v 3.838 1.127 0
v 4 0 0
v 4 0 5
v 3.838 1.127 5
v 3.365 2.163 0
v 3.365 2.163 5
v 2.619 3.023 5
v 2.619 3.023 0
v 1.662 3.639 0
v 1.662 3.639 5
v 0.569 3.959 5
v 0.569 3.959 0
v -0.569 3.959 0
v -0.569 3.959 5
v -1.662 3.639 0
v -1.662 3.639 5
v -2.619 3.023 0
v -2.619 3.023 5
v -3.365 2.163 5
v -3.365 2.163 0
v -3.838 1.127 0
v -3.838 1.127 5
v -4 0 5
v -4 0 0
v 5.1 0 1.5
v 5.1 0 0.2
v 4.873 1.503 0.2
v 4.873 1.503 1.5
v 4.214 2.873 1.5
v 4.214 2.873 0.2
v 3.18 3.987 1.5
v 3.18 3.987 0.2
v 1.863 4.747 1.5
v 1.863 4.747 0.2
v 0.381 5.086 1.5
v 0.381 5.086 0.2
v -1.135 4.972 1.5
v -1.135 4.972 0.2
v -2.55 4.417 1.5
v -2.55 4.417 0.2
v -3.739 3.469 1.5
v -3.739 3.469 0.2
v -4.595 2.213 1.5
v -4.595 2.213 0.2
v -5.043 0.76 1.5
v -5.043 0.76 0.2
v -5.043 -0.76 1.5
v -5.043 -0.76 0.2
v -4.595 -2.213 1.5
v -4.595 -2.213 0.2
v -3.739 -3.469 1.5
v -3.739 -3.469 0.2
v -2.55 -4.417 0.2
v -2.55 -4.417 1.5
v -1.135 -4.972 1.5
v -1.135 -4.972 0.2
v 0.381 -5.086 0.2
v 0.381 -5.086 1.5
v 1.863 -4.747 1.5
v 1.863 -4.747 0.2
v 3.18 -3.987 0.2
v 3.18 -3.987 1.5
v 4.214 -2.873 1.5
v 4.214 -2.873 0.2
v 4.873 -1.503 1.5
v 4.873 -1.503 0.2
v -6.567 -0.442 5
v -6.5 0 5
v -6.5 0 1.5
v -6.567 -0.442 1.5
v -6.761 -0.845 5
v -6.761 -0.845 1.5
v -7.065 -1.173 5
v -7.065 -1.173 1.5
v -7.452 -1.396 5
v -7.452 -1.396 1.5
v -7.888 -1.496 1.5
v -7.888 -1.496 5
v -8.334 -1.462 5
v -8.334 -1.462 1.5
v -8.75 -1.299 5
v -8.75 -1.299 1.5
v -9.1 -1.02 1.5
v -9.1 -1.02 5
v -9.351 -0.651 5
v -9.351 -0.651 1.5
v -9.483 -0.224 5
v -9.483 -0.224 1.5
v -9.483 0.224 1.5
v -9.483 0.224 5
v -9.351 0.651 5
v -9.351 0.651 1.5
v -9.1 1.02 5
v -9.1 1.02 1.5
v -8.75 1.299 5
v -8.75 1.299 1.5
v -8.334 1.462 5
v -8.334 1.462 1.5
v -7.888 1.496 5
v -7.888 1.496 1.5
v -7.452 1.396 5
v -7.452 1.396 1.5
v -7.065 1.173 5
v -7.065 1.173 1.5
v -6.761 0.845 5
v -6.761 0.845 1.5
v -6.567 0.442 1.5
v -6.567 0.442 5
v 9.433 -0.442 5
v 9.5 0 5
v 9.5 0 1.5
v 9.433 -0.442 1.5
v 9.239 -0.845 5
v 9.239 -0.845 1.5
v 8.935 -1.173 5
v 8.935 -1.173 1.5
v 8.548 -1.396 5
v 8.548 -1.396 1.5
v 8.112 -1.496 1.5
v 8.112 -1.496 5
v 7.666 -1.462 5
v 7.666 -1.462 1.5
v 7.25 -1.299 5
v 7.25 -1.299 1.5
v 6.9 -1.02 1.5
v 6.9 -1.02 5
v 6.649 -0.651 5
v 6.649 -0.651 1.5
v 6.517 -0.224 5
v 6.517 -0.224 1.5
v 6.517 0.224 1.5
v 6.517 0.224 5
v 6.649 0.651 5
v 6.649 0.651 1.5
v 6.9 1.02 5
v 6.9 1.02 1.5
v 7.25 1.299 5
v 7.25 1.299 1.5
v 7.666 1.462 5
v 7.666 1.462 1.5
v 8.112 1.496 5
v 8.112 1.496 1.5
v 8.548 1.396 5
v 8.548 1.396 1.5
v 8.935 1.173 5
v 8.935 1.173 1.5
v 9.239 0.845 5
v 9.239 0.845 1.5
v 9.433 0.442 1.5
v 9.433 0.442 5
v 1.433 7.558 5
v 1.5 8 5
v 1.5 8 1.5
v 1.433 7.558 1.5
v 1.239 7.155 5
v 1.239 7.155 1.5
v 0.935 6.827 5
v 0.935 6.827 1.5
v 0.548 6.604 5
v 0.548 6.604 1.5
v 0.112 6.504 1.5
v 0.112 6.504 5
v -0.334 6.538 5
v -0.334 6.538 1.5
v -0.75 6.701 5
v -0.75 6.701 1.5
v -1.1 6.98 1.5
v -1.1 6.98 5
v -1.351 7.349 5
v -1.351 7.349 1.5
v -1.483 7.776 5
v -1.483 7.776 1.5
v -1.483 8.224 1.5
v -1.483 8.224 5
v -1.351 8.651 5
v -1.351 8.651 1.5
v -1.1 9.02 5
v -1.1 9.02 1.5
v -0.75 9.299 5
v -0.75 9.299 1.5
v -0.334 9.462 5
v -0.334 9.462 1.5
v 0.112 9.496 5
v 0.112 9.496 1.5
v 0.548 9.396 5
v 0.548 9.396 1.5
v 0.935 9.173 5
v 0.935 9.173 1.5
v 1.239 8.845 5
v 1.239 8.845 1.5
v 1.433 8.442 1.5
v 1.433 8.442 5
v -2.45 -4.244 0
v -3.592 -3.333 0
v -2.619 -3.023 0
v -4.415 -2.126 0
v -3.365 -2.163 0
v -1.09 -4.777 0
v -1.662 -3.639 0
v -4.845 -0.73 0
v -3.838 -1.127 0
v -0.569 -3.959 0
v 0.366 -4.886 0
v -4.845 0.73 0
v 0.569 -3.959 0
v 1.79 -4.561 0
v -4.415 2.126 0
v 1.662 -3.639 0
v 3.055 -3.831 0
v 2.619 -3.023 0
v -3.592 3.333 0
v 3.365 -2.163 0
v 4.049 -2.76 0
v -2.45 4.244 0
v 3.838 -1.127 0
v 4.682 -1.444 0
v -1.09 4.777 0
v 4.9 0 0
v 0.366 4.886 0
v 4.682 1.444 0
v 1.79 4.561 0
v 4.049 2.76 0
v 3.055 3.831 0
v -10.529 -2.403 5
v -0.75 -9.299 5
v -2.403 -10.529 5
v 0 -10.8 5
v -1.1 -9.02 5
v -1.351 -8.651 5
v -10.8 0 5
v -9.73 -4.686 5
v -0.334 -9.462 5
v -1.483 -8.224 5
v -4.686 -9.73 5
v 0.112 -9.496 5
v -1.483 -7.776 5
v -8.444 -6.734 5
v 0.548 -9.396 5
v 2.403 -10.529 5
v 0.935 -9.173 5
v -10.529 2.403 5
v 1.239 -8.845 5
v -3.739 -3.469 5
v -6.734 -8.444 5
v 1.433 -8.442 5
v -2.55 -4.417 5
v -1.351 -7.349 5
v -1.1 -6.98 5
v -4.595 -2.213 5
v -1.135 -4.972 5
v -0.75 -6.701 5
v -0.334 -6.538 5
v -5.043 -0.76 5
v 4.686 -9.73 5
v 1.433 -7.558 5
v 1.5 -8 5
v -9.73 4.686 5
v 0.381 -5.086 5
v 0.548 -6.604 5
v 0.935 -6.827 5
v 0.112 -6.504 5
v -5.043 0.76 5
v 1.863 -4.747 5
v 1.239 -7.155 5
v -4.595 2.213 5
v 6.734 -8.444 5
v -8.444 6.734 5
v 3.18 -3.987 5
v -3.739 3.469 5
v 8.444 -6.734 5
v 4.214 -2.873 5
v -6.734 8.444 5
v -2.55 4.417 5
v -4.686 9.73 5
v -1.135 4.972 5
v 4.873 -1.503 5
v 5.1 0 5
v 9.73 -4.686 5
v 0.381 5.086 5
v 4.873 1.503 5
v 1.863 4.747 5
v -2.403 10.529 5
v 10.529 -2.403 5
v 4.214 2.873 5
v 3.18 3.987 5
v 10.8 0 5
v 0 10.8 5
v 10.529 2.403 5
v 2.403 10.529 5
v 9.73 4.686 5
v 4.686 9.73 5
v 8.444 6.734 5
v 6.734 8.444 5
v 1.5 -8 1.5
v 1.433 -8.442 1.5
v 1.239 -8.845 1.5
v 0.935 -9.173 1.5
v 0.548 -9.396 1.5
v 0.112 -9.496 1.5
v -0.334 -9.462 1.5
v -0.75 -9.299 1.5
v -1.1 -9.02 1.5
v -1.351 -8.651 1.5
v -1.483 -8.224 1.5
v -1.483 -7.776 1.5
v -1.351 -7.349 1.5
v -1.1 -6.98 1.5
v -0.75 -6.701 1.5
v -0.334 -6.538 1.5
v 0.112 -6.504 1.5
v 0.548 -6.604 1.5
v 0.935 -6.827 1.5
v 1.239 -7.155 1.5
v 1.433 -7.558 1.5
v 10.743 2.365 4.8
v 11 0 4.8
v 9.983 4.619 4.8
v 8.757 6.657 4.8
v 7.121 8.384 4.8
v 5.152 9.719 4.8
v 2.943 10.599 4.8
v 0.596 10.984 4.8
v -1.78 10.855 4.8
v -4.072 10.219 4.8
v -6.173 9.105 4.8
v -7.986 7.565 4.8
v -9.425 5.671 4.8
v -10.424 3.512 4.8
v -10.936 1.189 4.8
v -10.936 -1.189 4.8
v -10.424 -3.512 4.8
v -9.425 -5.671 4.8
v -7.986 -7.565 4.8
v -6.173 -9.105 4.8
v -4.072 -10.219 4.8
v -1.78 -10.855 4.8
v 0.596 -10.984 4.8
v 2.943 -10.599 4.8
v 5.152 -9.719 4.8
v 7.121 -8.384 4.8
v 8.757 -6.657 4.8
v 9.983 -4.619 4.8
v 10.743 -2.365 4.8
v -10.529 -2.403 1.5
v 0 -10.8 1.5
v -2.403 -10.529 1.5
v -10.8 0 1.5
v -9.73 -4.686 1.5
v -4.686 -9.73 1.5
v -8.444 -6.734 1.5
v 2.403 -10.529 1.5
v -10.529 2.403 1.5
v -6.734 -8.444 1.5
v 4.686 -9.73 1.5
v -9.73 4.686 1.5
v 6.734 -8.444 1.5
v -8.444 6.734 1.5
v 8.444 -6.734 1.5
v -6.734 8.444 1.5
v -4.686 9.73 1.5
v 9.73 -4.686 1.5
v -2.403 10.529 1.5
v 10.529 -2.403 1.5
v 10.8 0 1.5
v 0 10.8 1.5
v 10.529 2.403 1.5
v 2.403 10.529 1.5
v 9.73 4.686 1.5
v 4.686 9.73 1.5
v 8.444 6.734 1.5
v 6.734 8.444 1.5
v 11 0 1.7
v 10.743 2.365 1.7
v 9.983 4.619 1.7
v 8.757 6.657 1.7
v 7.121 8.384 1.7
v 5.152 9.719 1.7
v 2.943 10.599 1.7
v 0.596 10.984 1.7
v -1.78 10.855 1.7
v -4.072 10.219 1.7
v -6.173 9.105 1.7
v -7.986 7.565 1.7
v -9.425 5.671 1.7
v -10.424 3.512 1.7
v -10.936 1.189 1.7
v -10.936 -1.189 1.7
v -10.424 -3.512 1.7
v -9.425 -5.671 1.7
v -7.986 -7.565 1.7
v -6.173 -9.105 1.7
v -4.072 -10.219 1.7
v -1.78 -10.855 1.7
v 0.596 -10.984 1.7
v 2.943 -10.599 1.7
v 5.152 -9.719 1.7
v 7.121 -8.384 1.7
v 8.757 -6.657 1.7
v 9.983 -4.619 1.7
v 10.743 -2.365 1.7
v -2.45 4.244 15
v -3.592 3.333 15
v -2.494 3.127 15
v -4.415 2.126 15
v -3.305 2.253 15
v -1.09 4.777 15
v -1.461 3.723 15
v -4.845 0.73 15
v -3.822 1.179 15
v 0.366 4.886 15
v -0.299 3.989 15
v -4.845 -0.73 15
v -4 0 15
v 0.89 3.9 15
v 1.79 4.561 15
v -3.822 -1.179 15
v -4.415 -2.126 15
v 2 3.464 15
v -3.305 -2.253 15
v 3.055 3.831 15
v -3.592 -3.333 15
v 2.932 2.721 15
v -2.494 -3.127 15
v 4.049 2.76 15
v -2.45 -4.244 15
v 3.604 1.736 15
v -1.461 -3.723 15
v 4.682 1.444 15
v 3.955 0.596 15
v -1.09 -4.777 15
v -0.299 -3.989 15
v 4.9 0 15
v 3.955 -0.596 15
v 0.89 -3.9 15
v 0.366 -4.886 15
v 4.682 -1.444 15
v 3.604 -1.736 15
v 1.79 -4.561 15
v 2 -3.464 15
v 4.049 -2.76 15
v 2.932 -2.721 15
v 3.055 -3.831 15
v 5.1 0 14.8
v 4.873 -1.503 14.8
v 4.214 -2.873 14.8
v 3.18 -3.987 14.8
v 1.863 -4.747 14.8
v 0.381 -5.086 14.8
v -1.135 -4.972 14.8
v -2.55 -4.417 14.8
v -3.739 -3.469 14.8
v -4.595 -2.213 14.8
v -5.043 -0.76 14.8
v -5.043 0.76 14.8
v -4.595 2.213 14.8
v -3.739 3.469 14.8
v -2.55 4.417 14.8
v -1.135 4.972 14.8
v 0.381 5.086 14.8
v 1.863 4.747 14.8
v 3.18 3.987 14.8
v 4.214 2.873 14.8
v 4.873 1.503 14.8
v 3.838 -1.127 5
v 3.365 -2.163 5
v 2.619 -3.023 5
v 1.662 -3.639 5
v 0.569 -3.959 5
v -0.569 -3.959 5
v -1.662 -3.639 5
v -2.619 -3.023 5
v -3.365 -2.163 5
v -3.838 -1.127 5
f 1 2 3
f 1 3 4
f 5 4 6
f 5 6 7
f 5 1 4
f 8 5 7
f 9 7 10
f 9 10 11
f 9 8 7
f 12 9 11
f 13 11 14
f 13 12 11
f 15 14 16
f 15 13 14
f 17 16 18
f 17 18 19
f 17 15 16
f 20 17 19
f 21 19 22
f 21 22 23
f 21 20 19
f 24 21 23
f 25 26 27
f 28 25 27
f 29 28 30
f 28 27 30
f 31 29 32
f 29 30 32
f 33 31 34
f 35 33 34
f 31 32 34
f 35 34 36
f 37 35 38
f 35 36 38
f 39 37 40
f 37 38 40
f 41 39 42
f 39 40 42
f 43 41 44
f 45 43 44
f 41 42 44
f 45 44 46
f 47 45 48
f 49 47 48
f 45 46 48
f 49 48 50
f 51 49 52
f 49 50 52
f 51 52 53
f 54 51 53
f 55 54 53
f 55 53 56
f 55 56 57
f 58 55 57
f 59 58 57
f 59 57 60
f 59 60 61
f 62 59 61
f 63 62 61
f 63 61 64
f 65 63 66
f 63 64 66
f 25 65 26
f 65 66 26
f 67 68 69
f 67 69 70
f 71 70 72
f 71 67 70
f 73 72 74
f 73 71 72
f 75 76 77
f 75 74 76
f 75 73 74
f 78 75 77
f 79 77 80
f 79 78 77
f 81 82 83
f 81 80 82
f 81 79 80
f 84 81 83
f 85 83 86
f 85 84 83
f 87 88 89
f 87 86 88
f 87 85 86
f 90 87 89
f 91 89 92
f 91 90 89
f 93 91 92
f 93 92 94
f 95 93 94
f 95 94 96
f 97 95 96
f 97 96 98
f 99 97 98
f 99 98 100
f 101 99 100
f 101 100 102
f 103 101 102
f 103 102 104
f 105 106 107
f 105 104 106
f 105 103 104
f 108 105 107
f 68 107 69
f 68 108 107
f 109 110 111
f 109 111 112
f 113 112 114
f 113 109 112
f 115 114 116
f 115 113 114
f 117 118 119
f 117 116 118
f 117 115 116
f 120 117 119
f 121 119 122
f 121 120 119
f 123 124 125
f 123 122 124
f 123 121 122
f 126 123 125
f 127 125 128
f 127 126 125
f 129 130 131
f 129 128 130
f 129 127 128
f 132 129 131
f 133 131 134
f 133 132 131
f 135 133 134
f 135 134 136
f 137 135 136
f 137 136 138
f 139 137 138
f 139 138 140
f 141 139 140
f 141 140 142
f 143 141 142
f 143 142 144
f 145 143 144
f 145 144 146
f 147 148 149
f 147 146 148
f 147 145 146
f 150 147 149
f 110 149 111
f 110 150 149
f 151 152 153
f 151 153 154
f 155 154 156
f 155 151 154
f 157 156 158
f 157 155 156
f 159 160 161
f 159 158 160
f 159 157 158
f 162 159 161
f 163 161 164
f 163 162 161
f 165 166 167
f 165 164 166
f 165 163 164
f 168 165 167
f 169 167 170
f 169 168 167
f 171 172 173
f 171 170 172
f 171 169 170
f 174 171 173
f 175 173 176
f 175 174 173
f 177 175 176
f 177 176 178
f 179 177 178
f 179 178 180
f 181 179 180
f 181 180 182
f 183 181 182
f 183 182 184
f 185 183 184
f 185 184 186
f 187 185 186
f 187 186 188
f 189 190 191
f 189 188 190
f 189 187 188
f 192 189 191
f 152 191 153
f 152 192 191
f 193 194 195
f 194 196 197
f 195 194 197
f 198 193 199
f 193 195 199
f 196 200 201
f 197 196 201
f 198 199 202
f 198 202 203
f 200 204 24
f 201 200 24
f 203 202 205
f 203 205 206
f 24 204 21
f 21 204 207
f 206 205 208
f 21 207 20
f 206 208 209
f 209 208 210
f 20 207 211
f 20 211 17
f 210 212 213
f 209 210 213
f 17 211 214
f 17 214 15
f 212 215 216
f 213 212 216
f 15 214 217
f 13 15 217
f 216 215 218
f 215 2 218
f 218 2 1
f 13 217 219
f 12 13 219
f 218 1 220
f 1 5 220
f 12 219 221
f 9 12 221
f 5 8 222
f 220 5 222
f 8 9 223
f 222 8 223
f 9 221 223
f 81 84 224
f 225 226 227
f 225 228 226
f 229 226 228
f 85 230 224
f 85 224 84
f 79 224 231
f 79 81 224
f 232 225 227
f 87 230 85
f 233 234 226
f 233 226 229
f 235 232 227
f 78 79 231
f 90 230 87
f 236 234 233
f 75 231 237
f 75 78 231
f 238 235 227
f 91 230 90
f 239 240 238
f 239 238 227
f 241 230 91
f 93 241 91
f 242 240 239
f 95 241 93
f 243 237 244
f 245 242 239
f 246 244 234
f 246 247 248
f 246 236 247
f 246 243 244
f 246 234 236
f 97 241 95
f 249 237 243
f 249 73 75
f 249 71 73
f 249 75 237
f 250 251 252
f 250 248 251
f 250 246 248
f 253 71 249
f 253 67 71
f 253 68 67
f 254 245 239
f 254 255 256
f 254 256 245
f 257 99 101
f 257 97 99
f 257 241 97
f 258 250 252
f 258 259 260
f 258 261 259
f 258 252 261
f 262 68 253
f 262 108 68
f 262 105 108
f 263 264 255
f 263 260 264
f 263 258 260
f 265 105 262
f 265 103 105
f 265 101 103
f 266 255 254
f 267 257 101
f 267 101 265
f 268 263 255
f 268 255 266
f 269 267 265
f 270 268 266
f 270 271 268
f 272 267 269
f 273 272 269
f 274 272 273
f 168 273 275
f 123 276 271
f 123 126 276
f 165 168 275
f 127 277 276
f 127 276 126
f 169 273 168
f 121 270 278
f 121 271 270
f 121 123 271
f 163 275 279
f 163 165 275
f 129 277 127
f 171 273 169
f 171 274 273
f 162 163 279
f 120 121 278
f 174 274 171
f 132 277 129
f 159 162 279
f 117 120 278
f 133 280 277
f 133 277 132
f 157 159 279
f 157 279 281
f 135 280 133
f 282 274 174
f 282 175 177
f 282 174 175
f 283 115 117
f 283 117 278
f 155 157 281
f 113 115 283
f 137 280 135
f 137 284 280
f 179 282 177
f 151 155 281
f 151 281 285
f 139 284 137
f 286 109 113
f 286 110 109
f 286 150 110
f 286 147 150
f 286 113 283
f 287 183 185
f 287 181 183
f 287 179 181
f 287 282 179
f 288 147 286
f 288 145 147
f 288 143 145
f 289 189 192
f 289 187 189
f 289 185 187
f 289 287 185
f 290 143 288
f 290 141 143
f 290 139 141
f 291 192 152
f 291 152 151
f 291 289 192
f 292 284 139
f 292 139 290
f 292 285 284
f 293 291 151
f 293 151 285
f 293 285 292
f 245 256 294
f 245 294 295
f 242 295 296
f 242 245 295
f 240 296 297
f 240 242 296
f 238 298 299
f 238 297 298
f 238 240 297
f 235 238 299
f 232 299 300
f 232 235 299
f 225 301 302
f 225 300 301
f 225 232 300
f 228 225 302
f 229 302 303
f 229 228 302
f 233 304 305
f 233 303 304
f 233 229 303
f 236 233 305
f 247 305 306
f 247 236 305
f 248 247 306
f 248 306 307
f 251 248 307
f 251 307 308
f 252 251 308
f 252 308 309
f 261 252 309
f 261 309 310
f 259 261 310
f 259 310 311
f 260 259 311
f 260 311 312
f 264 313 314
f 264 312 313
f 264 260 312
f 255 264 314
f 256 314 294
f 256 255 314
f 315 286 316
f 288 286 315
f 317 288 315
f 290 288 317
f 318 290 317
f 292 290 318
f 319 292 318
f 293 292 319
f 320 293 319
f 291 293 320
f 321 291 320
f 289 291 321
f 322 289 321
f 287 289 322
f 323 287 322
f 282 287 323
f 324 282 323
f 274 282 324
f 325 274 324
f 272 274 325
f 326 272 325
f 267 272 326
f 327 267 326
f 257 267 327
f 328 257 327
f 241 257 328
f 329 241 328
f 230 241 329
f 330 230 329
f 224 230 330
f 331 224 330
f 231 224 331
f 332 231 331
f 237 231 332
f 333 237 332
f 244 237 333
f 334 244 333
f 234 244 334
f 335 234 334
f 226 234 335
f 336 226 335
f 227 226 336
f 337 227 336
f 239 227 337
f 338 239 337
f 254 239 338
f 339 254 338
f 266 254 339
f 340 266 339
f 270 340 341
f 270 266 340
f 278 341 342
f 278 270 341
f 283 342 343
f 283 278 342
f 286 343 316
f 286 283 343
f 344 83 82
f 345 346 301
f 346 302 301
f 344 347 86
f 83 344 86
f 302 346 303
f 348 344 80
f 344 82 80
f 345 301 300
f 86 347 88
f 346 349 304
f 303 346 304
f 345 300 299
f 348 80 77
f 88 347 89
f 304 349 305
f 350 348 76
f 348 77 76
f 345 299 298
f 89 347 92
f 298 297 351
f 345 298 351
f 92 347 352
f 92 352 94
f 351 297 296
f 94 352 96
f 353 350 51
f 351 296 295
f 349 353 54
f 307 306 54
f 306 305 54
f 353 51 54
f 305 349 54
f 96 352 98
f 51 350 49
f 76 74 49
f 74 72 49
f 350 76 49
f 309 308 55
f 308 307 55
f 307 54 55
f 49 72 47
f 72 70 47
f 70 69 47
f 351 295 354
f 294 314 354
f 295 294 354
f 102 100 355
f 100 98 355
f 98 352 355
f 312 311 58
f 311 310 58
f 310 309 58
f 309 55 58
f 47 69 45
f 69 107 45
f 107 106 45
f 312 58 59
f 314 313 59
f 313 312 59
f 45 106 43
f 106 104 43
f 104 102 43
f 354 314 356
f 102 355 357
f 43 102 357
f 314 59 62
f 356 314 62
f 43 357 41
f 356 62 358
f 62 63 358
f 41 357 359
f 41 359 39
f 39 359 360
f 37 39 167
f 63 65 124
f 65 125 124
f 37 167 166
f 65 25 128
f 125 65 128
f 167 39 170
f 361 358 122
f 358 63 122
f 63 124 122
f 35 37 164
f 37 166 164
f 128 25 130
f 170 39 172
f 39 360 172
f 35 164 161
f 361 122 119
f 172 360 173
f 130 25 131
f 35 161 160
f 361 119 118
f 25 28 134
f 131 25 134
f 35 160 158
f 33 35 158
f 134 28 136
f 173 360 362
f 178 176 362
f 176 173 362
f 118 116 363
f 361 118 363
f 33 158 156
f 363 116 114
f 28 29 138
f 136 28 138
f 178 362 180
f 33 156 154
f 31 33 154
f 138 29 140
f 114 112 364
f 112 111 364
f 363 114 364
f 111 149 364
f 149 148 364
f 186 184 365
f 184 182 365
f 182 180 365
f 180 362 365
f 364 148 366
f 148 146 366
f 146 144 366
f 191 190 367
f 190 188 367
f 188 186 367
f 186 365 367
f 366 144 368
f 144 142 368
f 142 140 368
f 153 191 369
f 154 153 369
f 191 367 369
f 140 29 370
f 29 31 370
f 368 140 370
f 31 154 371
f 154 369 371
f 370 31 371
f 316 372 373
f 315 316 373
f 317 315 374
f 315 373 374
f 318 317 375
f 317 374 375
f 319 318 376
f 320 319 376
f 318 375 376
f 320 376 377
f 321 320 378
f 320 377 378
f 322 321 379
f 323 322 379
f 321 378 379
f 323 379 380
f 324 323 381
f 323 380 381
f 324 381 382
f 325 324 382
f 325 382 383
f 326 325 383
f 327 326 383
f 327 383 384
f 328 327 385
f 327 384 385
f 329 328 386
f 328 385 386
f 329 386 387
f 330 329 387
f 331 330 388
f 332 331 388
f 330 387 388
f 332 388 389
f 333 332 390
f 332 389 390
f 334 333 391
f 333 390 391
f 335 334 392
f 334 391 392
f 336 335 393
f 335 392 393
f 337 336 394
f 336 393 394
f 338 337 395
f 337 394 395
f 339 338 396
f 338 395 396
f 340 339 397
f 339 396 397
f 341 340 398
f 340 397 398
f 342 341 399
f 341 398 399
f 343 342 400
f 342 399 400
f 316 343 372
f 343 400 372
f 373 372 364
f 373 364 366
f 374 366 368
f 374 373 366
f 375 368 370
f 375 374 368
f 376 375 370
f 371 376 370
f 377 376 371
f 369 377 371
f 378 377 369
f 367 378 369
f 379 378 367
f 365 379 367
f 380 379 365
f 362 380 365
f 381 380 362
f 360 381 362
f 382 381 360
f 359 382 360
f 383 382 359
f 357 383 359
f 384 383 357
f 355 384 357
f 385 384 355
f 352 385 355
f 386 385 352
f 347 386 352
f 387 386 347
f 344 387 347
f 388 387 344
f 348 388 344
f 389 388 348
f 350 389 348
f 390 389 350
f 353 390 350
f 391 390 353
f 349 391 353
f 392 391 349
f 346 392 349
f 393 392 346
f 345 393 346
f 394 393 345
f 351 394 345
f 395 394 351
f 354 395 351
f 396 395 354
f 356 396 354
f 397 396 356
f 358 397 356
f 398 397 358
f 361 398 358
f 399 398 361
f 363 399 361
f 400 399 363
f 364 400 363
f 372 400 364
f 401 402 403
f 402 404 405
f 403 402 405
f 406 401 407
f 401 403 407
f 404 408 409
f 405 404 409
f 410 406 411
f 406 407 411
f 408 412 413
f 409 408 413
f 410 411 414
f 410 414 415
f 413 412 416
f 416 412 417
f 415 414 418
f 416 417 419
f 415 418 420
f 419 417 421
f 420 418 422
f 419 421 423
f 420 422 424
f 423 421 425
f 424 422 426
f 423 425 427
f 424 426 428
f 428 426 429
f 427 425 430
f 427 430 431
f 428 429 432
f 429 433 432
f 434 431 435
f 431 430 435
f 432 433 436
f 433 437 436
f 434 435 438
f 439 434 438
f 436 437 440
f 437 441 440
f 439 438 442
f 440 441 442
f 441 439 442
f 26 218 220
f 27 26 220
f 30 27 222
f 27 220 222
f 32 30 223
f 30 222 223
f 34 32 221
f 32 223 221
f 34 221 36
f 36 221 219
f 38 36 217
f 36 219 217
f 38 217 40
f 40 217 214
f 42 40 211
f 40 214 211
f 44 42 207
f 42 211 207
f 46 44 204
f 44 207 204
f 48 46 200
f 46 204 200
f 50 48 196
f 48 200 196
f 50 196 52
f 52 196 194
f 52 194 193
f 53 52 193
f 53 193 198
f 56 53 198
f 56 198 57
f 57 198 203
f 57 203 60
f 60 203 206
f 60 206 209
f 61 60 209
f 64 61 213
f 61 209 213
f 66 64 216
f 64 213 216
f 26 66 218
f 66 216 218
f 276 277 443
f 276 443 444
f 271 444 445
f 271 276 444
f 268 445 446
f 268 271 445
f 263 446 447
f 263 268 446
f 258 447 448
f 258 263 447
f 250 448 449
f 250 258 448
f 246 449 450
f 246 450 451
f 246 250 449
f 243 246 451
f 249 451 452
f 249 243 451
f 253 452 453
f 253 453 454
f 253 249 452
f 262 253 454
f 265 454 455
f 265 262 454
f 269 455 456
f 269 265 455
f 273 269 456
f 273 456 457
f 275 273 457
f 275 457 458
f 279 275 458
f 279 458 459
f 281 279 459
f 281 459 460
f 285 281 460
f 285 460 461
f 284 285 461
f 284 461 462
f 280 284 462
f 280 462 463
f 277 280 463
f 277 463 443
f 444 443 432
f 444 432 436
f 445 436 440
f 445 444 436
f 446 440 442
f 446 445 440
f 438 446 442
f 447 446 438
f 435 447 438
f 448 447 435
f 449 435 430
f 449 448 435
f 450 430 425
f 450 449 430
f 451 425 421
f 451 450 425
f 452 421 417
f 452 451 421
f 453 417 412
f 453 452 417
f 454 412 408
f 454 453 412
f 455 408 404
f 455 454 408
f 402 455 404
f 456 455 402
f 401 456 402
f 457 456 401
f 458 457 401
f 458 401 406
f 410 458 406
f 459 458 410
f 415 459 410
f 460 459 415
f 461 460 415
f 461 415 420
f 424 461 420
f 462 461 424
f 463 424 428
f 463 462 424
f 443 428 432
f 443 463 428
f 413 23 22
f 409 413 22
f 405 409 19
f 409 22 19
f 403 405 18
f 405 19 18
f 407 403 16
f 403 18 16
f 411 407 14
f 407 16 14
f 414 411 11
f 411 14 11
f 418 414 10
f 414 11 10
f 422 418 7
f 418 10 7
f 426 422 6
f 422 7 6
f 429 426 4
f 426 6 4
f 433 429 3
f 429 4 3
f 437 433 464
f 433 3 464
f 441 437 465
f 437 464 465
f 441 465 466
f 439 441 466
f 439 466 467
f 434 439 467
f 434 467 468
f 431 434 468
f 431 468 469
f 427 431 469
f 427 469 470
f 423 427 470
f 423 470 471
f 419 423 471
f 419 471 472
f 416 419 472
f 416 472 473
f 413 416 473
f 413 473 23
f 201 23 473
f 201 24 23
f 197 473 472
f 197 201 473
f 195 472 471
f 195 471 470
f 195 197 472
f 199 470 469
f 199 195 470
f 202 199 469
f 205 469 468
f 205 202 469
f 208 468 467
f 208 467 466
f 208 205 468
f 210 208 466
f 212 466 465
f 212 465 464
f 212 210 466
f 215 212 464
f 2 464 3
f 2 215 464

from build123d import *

# Parameters (mm, degrees)
SKETCH1_R               = 5.1
SKETCH1_R_2             = 4
BOSS_EXTRUDE1_DEPTH     = 1.5
SKETCH2_R               = 11
SKETCH2_R_2             = 4
BOSS_EXTRUDE2_DEPTH     = 3.5
SKETCH3_R               = 5.1
SKETCH3_R_2             = 4
BOSS_EXTRUDE3_DEPTH     = 15
CUT_EXTRUDE1_DEPTH      = 21.597329924
CUT_EXTRUDE1_DEPTH_BACK = 21.597329924
SKETCH4_R               = 1.5
CHAMFER1_SIZE           = 0.2


with BuildPart() as part:
    # Sketch1 → Boss-Extrude1 (new body)
    with BuildSketch(Plane.XY):
        Circle(SKETCH1_R)
        Circle(SKETCH1_R_2, mode=Mode.SUBTRACT)
    extrude(amount=BOSS_EXTRUDE1_DEPTH)

    # Sketch2 → Boss-Extrude2 (add)
    with BuildSketch(Plane.XY.offset(1.5)):
        Circle(SKETCH2_R)
        Circle(SKETCH2_R_2, mode=Mode.SUBTRACT)
    extrude(amount=BOSS_EXTRUDE2_DEPTH)

    # Sketch3 → Boss-Extrude3 (add)
    with BuildSketch(Plane(origin=(0, 0, 0), x_dir=(-1, 0, 0), z_dir=(0, 0, -1))):
        with Locations(Location((0, 0, 0), (0, 0, 180))):
            Circle(SKETCH3_R)
        Circle(SKETCH3_R_2, mode=Mode.SUBTRACT)
    extrude(amount=-BOSS_EXTRUDE3_DEPTH)

    # Sketch4 → Cut-Extrude1 (cut, two sides: drawn at the far end of the back side and taken through both)
    with BuildSketch(Plane(origin=(0, 0, 1.5), x_dir=(-1, 0, 0), z_dir=(0, 0, -1)).offset(-CUT_EXTRUDE1_DEPTH_BACK)):
        with Locations(Location((0, 8, 0), (0, 0, 180))):
            Circle(SKETCH4_R)
        with Locations(Location((8, 0, 0), (0, 0, 180))):
            Circle(SKETCH4_R)
        with Locations(Location((0, -8, 0), (0, 0, 180))):
            Circle(SKETCH4_R)
        with Locations(Location((-8, 0, 0), (0, 0, 180))):
            Circle(SKETCH4_R)
    extrude(amount=CUT_EXTRUDE1_DEPTH + CUT_EXTRUDE1_DEPTH_BACK, mode=Mode.SUBTRACT)

    # Chamfer1
    chamfer1_edges = [part.edges().sort_by_distance(p)[0] for p in [
        (-11, 0, 5),
        (-11, 0, 1.5),
        (-5.1, 0, 15),
        (-5.1, 0, 0),
    ]]
    chamfer(chamfer1_edges, length=CHAMFER1_SIZE)


solid = part.part
